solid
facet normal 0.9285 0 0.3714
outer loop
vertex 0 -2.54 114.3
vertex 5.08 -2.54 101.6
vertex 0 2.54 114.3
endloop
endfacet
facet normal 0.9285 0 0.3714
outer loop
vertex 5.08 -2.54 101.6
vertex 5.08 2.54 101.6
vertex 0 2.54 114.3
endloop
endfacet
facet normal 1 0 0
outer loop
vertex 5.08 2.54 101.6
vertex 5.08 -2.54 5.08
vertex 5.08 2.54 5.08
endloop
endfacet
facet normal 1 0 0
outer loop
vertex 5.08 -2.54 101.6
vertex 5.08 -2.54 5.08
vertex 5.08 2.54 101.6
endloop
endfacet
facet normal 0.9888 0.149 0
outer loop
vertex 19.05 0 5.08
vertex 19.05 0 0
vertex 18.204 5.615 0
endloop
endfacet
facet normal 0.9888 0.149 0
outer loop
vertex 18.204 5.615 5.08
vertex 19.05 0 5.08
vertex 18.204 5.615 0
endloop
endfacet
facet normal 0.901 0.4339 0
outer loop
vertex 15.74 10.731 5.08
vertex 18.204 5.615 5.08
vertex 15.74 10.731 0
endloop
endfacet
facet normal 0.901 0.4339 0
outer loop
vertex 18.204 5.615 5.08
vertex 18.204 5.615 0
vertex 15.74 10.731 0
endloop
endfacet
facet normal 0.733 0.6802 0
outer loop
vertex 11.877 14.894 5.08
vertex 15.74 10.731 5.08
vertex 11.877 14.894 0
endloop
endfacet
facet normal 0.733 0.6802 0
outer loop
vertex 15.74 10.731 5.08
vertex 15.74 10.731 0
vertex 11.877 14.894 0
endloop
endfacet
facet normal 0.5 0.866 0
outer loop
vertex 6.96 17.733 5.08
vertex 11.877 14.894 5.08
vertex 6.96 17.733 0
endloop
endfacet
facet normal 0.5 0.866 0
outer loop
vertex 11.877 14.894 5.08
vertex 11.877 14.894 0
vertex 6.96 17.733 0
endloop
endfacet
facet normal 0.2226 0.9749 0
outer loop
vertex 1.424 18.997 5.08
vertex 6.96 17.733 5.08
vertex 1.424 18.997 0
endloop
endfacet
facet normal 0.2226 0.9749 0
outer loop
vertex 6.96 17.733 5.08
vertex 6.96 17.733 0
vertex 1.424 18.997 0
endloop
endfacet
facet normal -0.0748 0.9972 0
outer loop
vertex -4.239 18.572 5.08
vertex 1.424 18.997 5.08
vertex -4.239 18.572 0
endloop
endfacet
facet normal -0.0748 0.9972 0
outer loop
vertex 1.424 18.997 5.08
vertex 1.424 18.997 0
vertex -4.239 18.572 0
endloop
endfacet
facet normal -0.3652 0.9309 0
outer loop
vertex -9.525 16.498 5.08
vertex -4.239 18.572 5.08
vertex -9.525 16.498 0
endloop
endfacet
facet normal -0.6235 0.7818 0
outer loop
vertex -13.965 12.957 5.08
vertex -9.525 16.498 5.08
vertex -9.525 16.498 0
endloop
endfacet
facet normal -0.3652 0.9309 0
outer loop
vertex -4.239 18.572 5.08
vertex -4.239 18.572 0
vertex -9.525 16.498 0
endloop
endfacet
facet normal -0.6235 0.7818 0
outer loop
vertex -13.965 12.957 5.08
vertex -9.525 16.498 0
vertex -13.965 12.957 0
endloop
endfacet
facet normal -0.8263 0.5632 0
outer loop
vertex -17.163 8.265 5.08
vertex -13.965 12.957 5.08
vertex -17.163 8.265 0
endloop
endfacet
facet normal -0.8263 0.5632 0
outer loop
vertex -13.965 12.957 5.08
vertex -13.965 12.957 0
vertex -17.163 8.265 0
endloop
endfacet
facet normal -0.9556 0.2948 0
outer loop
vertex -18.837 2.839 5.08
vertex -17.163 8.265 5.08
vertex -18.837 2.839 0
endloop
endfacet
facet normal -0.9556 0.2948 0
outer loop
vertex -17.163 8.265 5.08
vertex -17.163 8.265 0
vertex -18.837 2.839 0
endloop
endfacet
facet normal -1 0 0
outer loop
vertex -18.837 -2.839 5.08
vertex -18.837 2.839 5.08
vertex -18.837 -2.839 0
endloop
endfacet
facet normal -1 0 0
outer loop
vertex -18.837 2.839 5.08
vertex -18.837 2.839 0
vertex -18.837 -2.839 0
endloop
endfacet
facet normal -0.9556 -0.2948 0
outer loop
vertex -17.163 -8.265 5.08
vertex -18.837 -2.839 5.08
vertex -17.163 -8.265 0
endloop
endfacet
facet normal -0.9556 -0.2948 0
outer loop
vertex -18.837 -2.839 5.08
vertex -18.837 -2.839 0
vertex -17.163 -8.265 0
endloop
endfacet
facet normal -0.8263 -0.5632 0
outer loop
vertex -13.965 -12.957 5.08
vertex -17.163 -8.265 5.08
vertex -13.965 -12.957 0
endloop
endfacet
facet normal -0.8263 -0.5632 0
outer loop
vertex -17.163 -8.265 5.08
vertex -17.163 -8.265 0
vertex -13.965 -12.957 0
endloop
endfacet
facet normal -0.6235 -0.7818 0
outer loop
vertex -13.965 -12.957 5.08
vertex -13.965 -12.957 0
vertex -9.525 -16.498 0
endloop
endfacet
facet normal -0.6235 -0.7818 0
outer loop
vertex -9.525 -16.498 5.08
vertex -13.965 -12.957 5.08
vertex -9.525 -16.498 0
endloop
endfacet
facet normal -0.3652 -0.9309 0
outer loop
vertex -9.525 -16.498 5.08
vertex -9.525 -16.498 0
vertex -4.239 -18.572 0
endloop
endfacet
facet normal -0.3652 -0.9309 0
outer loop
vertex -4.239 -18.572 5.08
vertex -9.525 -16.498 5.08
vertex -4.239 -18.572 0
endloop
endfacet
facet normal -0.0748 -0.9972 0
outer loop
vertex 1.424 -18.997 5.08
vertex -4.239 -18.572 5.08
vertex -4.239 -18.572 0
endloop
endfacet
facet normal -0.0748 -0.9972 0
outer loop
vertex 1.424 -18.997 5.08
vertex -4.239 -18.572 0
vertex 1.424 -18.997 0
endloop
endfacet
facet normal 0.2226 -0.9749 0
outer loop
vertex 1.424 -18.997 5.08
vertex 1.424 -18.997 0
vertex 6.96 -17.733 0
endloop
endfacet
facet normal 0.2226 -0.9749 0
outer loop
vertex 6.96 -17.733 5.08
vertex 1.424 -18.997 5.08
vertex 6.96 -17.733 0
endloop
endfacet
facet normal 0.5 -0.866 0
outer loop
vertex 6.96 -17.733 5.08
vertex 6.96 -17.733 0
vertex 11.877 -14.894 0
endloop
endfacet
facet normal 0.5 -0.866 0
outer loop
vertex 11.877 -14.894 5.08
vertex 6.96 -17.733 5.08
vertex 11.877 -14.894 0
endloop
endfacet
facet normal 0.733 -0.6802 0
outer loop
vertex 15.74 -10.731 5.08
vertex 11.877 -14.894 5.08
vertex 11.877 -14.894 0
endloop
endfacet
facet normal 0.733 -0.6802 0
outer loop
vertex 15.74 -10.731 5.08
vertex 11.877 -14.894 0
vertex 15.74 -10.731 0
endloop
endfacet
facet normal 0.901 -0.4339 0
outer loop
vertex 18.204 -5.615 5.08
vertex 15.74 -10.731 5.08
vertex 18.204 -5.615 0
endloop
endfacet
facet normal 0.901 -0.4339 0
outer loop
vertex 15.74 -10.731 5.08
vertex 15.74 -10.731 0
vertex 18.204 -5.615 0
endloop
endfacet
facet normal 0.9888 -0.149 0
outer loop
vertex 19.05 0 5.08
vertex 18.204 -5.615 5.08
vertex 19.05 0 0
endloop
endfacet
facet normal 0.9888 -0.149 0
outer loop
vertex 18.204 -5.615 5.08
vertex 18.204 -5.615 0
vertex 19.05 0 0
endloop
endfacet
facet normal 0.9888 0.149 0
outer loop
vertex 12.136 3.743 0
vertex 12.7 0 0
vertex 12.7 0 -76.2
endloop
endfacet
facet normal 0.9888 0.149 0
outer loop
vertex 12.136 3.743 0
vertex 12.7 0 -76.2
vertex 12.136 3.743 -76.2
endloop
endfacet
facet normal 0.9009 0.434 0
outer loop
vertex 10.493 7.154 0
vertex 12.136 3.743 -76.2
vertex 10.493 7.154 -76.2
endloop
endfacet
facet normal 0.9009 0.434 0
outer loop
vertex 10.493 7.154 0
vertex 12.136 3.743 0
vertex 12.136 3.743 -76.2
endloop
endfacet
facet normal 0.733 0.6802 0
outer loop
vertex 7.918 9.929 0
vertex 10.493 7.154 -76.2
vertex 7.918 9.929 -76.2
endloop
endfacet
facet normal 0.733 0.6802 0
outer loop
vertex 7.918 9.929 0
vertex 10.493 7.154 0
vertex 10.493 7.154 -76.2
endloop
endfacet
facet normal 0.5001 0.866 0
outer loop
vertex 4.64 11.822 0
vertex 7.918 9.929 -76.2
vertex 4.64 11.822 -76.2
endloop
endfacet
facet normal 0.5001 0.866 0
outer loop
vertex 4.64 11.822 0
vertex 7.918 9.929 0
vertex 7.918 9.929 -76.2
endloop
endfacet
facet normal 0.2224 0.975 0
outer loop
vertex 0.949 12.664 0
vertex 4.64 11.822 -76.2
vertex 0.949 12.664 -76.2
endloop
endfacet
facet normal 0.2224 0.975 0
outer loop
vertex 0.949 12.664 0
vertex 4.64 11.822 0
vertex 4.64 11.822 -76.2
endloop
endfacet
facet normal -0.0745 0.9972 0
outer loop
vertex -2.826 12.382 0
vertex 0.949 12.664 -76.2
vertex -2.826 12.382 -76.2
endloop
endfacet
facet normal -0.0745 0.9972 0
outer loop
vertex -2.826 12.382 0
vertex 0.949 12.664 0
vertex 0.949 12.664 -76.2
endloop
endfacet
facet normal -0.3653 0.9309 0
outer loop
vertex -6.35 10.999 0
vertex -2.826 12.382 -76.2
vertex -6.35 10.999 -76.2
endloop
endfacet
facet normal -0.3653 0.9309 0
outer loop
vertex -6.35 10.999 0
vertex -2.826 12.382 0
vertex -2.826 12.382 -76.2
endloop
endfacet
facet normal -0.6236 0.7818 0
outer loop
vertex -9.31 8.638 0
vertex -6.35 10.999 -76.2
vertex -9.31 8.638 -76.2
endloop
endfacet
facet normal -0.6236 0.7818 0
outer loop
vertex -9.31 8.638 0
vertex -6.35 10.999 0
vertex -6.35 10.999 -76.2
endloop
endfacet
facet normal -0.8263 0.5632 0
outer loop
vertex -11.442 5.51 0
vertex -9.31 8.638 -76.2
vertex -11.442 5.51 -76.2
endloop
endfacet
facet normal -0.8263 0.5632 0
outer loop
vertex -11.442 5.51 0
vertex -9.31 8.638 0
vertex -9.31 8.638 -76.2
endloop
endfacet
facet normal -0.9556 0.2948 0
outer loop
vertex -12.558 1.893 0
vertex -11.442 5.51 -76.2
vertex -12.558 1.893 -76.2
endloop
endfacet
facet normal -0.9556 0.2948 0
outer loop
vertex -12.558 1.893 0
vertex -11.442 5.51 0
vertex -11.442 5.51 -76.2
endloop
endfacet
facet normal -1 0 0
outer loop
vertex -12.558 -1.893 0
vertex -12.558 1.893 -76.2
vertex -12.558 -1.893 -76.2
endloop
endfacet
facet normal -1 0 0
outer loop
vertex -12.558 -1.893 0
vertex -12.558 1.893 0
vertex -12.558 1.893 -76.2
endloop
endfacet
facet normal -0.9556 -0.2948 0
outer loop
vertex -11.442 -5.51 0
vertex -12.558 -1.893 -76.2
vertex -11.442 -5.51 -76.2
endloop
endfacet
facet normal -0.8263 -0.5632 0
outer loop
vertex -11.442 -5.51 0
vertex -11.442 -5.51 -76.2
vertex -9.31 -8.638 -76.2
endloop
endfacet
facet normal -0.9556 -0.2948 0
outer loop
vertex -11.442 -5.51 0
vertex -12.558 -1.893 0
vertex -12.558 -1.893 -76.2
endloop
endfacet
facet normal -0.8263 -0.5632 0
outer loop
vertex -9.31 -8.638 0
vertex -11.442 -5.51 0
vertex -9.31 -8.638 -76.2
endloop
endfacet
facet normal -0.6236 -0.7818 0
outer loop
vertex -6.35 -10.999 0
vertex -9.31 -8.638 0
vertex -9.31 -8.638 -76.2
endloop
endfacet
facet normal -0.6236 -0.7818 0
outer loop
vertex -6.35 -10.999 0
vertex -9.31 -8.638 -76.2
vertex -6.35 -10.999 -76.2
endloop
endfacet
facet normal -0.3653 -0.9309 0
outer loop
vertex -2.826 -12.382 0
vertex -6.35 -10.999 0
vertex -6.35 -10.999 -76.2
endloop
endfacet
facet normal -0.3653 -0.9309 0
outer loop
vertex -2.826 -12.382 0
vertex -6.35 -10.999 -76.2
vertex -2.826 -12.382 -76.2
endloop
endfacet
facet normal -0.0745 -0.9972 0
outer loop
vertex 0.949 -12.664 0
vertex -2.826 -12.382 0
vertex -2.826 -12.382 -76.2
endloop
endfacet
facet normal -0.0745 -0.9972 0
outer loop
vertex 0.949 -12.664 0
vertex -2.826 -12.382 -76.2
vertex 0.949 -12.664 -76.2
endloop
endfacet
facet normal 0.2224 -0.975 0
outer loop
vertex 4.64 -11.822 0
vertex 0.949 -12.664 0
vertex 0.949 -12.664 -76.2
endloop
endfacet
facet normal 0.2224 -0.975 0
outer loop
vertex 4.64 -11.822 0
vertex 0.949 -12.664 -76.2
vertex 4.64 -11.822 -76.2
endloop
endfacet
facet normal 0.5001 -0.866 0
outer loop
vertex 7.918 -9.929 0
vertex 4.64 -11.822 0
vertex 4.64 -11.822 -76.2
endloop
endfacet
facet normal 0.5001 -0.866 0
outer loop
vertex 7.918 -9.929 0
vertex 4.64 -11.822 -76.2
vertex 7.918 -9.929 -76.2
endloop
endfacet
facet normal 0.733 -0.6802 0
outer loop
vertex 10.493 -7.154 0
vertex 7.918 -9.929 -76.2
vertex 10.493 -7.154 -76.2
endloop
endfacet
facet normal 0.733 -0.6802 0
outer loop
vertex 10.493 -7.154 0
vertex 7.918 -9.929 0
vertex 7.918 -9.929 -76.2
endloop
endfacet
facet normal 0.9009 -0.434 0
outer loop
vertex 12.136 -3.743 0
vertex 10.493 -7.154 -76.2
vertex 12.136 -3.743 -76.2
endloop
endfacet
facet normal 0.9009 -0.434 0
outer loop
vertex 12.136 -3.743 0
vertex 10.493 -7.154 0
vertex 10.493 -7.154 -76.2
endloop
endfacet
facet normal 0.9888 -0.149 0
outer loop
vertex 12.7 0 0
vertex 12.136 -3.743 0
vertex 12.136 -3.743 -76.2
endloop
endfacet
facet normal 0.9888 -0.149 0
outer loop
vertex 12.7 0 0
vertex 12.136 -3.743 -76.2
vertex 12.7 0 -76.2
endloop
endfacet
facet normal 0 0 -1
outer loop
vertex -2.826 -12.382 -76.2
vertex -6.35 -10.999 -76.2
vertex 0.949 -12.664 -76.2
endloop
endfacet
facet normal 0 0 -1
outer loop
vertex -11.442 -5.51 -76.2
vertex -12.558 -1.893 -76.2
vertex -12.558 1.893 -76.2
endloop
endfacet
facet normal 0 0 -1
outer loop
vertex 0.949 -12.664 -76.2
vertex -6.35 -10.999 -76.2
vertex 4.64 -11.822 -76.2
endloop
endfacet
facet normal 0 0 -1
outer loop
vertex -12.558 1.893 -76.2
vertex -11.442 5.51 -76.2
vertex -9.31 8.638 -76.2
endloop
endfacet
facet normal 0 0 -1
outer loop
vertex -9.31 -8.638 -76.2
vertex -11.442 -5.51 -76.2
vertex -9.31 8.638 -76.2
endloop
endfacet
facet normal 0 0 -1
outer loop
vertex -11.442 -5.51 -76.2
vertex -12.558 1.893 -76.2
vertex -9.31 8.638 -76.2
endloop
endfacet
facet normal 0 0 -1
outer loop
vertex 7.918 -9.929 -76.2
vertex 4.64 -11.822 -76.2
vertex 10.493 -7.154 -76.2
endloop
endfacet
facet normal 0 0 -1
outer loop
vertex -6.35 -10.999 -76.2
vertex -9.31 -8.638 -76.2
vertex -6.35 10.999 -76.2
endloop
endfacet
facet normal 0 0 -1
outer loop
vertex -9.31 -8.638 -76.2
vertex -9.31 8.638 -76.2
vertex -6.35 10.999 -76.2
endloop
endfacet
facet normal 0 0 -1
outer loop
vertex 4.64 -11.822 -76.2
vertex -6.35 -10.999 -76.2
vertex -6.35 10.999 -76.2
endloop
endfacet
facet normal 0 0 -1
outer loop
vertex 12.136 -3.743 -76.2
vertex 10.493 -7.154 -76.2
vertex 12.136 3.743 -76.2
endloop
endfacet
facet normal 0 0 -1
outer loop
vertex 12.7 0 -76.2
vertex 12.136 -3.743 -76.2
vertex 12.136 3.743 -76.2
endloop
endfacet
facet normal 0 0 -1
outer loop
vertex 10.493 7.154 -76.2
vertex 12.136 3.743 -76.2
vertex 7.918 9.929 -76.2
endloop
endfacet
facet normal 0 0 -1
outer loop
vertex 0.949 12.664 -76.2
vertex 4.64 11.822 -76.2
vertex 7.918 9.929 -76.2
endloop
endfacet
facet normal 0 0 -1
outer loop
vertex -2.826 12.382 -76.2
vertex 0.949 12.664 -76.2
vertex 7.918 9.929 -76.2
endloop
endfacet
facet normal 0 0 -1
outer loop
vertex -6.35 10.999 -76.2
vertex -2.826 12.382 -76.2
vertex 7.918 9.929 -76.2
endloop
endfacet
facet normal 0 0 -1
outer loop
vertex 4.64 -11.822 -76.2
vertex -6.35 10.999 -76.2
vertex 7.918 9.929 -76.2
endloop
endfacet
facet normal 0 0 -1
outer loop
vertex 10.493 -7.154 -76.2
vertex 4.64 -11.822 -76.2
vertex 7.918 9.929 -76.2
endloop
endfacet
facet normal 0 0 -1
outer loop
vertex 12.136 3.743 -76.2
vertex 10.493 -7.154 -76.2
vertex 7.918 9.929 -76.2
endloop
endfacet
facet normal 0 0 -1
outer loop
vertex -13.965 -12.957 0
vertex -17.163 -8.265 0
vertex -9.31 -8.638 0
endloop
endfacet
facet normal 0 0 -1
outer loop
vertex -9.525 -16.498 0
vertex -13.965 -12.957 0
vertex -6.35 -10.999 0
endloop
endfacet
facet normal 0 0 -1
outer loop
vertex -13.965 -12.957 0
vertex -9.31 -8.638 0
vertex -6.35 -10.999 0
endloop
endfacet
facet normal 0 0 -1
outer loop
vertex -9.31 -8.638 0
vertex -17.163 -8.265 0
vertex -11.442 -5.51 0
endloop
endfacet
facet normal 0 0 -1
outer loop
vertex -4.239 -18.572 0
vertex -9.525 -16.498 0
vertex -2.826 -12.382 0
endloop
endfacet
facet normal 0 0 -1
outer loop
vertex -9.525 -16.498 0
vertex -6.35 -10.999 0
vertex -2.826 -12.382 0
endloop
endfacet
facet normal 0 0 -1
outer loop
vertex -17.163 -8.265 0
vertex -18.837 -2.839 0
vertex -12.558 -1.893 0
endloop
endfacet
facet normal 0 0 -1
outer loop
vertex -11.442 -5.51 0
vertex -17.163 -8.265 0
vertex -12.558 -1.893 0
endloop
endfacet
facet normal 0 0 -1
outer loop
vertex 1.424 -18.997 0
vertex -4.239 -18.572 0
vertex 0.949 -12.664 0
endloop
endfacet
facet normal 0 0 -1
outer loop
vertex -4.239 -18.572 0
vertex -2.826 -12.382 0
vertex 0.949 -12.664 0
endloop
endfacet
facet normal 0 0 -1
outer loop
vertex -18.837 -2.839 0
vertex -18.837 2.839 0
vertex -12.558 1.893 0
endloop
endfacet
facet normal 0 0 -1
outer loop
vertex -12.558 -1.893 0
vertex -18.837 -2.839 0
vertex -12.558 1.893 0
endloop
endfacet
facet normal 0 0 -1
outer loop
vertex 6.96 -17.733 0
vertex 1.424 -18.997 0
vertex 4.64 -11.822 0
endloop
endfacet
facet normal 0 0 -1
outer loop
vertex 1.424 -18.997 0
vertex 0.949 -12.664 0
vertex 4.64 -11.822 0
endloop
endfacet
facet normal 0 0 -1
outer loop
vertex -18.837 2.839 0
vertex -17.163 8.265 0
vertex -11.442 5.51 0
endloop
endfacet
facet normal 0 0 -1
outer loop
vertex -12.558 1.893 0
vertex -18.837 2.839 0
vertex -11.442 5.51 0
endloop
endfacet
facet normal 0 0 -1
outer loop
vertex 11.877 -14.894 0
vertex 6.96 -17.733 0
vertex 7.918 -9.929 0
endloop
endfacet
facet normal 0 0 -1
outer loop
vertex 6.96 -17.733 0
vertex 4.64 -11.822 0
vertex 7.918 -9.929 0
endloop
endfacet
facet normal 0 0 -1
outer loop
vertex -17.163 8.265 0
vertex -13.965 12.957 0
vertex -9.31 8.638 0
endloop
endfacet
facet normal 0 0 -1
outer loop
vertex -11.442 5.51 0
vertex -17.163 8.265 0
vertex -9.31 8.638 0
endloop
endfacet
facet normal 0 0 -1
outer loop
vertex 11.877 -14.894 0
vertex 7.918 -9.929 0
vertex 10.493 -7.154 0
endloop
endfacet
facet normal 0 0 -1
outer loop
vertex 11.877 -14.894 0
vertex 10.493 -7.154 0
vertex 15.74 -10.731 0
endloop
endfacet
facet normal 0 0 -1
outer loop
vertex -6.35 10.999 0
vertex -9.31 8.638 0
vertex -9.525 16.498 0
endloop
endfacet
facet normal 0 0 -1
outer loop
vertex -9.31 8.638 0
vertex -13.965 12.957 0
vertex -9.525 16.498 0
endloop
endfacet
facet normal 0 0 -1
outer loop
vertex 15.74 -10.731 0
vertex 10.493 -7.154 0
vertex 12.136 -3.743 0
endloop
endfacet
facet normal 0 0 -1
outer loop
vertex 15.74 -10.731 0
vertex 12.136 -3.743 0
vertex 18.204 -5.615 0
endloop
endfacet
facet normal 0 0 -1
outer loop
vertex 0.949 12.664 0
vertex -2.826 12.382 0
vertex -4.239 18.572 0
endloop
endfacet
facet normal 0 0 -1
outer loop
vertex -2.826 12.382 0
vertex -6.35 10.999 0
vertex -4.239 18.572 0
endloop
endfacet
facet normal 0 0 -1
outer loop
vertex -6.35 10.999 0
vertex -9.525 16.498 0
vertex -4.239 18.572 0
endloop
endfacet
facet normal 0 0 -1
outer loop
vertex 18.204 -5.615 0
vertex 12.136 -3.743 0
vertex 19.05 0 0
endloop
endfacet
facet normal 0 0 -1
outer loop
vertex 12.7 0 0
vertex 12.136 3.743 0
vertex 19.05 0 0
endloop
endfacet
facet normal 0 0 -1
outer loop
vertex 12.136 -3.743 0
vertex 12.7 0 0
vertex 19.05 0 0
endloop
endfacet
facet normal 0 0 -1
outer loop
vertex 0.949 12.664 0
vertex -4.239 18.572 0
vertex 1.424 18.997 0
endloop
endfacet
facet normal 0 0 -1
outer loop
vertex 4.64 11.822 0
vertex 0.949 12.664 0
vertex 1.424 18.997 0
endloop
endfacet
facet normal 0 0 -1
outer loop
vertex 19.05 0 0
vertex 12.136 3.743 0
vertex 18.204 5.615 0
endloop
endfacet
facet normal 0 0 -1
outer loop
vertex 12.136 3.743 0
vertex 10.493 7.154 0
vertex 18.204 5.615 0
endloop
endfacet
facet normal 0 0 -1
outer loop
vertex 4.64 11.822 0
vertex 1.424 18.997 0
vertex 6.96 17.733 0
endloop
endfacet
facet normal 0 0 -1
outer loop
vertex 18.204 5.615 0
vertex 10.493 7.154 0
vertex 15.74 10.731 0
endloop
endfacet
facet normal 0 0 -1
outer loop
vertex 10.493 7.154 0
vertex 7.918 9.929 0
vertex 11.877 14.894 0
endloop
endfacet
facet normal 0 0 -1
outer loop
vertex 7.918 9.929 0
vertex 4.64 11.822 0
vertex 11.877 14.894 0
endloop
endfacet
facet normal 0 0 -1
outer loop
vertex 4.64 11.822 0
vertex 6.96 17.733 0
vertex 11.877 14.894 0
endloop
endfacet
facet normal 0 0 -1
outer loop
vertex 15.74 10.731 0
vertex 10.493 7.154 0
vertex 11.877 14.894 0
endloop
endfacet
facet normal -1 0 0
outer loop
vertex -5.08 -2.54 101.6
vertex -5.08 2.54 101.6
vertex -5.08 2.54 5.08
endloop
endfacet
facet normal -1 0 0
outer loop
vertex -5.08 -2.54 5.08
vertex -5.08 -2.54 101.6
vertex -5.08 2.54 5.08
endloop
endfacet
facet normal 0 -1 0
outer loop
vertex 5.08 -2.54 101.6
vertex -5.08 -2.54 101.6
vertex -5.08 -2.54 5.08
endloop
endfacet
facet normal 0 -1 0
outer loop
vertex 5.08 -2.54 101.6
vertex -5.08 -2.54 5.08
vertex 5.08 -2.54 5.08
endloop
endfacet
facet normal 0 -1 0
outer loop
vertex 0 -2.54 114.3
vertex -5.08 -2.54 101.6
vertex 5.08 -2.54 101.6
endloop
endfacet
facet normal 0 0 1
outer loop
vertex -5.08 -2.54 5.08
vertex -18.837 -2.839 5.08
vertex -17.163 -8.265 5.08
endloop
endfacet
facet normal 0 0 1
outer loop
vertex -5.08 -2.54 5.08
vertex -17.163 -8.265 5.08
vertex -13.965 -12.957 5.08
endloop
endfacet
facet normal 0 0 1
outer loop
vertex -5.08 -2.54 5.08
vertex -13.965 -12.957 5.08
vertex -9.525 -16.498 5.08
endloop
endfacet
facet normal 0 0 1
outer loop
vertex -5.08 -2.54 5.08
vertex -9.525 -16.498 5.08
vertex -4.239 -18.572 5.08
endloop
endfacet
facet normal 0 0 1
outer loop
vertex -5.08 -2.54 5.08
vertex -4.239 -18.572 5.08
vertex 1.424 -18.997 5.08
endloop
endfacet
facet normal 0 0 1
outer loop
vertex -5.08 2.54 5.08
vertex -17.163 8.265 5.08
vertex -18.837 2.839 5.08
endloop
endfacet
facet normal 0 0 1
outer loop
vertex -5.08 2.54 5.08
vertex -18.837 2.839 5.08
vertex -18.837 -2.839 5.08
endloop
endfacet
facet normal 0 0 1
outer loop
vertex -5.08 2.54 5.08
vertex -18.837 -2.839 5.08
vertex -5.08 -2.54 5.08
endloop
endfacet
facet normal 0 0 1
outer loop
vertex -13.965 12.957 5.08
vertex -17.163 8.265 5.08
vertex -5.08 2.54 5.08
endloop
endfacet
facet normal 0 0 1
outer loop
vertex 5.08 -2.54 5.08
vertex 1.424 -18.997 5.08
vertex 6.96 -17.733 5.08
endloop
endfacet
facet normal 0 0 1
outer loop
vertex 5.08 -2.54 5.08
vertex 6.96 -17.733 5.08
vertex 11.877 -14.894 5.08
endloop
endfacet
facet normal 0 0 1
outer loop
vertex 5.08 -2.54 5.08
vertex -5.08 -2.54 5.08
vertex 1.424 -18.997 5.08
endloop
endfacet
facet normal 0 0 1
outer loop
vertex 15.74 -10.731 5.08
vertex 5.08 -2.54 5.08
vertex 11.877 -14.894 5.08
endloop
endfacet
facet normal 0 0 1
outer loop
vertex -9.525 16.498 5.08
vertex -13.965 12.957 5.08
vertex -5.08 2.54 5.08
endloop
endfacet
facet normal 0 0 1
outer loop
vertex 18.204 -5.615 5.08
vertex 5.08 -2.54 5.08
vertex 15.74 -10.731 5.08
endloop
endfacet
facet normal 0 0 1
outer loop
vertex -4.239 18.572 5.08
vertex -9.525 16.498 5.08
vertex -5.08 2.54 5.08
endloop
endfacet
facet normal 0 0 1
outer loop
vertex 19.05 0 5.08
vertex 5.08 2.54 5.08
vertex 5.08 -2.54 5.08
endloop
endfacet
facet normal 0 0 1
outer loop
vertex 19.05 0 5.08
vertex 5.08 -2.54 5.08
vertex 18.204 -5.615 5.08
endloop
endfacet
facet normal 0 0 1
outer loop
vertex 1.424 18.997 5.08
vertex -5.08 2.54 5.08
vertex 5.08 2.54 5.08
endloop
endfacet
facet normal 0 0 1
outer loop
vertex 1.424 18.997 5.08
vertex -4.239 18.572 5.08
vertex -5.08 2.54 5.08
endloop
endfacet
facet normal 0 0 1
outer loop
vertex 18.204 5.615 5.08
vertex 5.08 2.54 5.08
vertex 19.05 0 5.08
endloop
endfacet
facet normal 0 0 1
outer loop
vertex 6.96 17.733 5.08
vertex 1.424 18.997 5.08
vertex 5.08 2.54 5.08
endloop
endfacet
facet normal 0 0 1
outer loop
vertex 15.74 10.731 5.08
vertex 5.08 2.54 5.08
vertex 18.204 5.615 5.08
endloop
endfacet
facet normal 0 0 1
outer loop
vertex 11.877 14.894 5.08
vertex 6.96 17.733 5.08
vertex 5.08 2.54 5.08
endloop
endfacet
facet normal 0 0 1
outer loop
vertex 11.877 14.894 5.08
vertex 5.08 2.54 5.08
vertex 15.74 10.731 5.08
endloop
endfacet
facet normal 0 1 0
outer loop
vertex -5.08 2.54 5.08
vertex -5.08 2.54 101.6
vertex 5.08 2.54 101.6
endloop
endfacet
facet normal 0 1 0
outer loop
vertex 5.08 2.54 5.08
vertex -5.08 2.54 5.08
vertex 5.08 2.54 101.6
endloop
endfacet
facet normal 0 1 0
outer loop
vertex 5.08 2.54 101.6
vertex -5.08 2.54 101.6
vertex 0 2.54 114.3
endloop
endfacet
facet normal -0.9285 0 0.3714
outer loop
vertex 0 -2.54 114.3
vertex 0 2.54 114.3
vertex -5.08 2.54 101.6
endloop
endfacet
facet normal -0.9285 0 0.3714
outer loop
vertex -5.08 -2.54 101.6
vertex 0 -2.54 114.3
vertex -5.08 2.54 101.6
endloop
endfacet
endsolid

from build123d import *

# Parameters (mm, degrees)
F0_R     = 12.7
F1_DEPTH = 76.2
F2_R     = 19.05
F3_DEPTH = 5.08
F5_DEPTH = 2.54
F7_DEPTH = 2.54


with BuildPart() as f1:
    # F0 (on Top) → F1 (new body)
    with BuildSketch(Plane.XY):
        Circle(F0_R)
    extrude(amount=-F1_DEPTH)

    # F2 (on Top) → F3 (join)
    with BuildSketch(Plane.XY):
        Circle(F2_R)
    extrude(amount=F3_DEPTH)

    # F4 (on Front) → F5 (join)
    with BuildSketch(Plane.XZ):
        Polygon((-5.08, 0), (0, 0), (0, 114.3), (-5.08, 101.6), align=None)
        Polygon((0, 114.3), (0, 0), (5.08, 0), (5.08, 101.6), align=None)
    extrude(amount=-F5_DEPTH)

    # F6 (on Front) → F7 (join)
    with BuildSketch(Plane.XZ):
        Polygon((-5.08, 0), (0, 0), (0, 114.3), (-5.08, 101.6), align=None)
        Polygon((0, 114.3), (0, 0), (5.08, 0), (5.08, 101.6), align=None)
    extrude(amount=F7_DEPTH)


solid = f1.part
